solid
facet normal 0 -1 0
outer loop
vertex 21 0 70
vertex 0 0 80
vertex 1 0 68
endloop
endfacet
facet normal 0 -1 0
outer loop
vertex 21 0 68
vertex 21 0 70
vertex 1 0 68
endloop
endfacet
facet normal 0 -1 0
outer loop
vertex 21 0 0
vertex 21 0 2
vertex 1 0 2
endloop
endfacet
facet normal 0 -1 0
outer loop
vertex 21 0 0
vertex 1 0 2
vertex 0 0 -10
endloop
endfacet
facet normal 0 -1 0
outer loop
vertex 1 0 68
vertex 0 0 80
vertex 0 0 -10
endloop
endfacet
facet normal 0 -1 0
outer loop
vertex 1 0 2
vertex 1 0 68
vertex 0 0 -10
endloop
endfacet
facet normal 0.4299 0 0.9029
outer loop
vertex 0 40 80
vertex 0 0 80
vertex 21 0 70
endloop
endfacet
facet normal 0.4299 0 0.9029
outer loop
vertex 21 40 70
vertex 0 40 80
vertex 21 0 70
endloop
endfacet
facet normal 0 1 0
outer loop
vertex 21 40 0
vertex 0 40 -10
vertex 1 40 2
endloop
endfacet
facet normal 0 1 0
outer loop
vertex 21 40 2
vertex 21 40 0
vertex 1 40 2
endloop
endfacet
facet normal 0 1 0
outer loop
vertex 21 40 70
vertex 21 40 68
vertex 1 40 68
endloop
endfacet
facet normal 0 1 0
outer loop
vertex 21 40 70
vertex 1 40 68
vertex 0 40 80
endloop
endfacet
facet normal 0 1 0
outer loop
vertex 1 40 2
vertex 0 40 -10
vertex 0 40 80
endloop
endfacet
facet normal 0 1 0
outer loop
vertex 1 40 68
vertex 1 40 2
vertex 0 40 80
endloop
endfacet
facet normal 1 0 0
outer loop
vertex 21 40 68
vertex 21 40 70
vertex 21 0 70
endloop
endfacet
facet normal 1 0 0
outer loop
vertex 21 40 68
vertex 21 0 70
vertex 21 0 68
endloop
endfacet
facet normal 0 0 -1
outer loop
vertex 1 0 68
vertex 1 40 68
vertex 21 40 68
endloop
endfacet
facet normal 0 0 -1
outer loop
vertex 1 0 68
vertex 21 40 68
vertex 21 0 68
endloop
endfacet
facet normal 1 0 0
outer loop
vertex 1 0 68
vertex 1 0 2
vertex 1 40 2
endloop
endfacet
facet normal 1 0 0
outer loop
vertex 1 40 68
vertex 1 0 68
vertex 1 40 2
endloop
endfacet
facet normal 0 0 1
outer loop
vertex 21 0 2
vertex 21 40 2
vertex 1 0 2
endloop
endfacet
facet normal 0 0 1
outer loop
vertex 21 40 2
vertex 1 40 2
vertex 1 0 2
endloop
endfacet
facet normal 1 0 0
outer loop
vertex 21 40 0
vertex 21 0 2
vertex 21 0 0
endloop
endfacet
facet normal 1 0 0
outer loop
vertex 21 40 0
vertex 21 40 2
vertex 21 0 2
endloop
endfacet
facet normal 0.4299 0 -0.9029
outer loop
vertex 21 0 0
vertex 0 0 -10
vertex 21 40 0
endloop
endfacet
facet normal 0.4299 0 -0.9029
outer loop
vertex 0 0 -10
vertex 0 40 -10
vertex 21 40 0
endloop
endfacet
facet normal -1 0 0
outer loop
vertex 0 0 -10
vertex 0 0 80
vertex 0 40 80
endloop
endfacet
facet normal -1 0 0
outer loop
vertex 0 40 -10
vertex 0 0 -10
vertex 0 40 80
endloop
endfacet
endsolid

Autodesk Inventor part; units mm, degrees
ref_plane "YZ Plane" through (0, 0, 0) normal (1, 0, 0) x (0, 1, 0)
ref_plane "XZ Plane" through (0, 0, 0) normal (0, 1, 0) x (-1, 0, 0)
ref_plane "XY Plane" through (0, 0, 0) normal (0, 0, 1) x (1, 0, 0)
sketch "Sketch1" plane through (0, 0, 0) normal (1, 0, 0) x (0, 1, 0)
  line L0 (0, 0) -> (40, 0)
  line L1 (40, 0) -> (40, 70)
  line L2 (40, 70) -> (0, 70)
  line L3 (0, 70) -> (0, 0)
  dimension "d0" = 40
  dimension "d1" = 70
extrude "Extrusion1" add sketch "Sketch1" along normal blind 1
sketch "Sketch2" plane through (1, 0, 0) normal (1, 0, 0) x (0, 0, -1)
  line L0 (-70, 40) -> (-70, 0) projected
  line L1 (-70, 0) -> (0, 0) projected
  line L2 (-70, 40) -> (-68, 40)
  line L3 (-68, 40) -> (-68, 0)
  line L4 (-68, 0) -> (-70, 0)
  line L5 (-70, 0) -> (-70, 40)
  line L6 (0, 0) -> (0, 40) projected
  line L7 (0, 40) -> (-2, 40)
  line L8 (-2, 40) -> (-2, 0)
  line L9 (-2, 0) -> (0, 0)
  line L10 (0, 0) -> (0, 40)
  dimension "d4" = 2
  dimension "d5" = 2
extrude "Extrusion2" add sketch "Sketch2" along normal blind 20
sketch "Sketch4" plane through (0, 40, 70) normal (0, 1, 0) x (1, 0, 0)
  line L0 (0, 70) -> (0, 80)
  line L1 (21, 68) -> (21, 70) projected
  line L2 (0, 80) -> (21, 70)
  line L3 (0, 70) -> (0, 0) projected
  line L4 (0, 0) -> (0, -10)
  line L5 (0, 0) -> (21, 0) projected
  line L6 (0, -10) -> (21, 0)
  line L7 (0, 70) -> (21, 70)
  line L8 (1, 68) -> (21, 68) projected
  dimension "d8" = 10
  dimension "d9" = 10
extrude "Extrusion3" add sketch "Sketch4" against normal blind 40
properties part number "MAN_BASIS_GRIPPER" material "ABS Plastic"
